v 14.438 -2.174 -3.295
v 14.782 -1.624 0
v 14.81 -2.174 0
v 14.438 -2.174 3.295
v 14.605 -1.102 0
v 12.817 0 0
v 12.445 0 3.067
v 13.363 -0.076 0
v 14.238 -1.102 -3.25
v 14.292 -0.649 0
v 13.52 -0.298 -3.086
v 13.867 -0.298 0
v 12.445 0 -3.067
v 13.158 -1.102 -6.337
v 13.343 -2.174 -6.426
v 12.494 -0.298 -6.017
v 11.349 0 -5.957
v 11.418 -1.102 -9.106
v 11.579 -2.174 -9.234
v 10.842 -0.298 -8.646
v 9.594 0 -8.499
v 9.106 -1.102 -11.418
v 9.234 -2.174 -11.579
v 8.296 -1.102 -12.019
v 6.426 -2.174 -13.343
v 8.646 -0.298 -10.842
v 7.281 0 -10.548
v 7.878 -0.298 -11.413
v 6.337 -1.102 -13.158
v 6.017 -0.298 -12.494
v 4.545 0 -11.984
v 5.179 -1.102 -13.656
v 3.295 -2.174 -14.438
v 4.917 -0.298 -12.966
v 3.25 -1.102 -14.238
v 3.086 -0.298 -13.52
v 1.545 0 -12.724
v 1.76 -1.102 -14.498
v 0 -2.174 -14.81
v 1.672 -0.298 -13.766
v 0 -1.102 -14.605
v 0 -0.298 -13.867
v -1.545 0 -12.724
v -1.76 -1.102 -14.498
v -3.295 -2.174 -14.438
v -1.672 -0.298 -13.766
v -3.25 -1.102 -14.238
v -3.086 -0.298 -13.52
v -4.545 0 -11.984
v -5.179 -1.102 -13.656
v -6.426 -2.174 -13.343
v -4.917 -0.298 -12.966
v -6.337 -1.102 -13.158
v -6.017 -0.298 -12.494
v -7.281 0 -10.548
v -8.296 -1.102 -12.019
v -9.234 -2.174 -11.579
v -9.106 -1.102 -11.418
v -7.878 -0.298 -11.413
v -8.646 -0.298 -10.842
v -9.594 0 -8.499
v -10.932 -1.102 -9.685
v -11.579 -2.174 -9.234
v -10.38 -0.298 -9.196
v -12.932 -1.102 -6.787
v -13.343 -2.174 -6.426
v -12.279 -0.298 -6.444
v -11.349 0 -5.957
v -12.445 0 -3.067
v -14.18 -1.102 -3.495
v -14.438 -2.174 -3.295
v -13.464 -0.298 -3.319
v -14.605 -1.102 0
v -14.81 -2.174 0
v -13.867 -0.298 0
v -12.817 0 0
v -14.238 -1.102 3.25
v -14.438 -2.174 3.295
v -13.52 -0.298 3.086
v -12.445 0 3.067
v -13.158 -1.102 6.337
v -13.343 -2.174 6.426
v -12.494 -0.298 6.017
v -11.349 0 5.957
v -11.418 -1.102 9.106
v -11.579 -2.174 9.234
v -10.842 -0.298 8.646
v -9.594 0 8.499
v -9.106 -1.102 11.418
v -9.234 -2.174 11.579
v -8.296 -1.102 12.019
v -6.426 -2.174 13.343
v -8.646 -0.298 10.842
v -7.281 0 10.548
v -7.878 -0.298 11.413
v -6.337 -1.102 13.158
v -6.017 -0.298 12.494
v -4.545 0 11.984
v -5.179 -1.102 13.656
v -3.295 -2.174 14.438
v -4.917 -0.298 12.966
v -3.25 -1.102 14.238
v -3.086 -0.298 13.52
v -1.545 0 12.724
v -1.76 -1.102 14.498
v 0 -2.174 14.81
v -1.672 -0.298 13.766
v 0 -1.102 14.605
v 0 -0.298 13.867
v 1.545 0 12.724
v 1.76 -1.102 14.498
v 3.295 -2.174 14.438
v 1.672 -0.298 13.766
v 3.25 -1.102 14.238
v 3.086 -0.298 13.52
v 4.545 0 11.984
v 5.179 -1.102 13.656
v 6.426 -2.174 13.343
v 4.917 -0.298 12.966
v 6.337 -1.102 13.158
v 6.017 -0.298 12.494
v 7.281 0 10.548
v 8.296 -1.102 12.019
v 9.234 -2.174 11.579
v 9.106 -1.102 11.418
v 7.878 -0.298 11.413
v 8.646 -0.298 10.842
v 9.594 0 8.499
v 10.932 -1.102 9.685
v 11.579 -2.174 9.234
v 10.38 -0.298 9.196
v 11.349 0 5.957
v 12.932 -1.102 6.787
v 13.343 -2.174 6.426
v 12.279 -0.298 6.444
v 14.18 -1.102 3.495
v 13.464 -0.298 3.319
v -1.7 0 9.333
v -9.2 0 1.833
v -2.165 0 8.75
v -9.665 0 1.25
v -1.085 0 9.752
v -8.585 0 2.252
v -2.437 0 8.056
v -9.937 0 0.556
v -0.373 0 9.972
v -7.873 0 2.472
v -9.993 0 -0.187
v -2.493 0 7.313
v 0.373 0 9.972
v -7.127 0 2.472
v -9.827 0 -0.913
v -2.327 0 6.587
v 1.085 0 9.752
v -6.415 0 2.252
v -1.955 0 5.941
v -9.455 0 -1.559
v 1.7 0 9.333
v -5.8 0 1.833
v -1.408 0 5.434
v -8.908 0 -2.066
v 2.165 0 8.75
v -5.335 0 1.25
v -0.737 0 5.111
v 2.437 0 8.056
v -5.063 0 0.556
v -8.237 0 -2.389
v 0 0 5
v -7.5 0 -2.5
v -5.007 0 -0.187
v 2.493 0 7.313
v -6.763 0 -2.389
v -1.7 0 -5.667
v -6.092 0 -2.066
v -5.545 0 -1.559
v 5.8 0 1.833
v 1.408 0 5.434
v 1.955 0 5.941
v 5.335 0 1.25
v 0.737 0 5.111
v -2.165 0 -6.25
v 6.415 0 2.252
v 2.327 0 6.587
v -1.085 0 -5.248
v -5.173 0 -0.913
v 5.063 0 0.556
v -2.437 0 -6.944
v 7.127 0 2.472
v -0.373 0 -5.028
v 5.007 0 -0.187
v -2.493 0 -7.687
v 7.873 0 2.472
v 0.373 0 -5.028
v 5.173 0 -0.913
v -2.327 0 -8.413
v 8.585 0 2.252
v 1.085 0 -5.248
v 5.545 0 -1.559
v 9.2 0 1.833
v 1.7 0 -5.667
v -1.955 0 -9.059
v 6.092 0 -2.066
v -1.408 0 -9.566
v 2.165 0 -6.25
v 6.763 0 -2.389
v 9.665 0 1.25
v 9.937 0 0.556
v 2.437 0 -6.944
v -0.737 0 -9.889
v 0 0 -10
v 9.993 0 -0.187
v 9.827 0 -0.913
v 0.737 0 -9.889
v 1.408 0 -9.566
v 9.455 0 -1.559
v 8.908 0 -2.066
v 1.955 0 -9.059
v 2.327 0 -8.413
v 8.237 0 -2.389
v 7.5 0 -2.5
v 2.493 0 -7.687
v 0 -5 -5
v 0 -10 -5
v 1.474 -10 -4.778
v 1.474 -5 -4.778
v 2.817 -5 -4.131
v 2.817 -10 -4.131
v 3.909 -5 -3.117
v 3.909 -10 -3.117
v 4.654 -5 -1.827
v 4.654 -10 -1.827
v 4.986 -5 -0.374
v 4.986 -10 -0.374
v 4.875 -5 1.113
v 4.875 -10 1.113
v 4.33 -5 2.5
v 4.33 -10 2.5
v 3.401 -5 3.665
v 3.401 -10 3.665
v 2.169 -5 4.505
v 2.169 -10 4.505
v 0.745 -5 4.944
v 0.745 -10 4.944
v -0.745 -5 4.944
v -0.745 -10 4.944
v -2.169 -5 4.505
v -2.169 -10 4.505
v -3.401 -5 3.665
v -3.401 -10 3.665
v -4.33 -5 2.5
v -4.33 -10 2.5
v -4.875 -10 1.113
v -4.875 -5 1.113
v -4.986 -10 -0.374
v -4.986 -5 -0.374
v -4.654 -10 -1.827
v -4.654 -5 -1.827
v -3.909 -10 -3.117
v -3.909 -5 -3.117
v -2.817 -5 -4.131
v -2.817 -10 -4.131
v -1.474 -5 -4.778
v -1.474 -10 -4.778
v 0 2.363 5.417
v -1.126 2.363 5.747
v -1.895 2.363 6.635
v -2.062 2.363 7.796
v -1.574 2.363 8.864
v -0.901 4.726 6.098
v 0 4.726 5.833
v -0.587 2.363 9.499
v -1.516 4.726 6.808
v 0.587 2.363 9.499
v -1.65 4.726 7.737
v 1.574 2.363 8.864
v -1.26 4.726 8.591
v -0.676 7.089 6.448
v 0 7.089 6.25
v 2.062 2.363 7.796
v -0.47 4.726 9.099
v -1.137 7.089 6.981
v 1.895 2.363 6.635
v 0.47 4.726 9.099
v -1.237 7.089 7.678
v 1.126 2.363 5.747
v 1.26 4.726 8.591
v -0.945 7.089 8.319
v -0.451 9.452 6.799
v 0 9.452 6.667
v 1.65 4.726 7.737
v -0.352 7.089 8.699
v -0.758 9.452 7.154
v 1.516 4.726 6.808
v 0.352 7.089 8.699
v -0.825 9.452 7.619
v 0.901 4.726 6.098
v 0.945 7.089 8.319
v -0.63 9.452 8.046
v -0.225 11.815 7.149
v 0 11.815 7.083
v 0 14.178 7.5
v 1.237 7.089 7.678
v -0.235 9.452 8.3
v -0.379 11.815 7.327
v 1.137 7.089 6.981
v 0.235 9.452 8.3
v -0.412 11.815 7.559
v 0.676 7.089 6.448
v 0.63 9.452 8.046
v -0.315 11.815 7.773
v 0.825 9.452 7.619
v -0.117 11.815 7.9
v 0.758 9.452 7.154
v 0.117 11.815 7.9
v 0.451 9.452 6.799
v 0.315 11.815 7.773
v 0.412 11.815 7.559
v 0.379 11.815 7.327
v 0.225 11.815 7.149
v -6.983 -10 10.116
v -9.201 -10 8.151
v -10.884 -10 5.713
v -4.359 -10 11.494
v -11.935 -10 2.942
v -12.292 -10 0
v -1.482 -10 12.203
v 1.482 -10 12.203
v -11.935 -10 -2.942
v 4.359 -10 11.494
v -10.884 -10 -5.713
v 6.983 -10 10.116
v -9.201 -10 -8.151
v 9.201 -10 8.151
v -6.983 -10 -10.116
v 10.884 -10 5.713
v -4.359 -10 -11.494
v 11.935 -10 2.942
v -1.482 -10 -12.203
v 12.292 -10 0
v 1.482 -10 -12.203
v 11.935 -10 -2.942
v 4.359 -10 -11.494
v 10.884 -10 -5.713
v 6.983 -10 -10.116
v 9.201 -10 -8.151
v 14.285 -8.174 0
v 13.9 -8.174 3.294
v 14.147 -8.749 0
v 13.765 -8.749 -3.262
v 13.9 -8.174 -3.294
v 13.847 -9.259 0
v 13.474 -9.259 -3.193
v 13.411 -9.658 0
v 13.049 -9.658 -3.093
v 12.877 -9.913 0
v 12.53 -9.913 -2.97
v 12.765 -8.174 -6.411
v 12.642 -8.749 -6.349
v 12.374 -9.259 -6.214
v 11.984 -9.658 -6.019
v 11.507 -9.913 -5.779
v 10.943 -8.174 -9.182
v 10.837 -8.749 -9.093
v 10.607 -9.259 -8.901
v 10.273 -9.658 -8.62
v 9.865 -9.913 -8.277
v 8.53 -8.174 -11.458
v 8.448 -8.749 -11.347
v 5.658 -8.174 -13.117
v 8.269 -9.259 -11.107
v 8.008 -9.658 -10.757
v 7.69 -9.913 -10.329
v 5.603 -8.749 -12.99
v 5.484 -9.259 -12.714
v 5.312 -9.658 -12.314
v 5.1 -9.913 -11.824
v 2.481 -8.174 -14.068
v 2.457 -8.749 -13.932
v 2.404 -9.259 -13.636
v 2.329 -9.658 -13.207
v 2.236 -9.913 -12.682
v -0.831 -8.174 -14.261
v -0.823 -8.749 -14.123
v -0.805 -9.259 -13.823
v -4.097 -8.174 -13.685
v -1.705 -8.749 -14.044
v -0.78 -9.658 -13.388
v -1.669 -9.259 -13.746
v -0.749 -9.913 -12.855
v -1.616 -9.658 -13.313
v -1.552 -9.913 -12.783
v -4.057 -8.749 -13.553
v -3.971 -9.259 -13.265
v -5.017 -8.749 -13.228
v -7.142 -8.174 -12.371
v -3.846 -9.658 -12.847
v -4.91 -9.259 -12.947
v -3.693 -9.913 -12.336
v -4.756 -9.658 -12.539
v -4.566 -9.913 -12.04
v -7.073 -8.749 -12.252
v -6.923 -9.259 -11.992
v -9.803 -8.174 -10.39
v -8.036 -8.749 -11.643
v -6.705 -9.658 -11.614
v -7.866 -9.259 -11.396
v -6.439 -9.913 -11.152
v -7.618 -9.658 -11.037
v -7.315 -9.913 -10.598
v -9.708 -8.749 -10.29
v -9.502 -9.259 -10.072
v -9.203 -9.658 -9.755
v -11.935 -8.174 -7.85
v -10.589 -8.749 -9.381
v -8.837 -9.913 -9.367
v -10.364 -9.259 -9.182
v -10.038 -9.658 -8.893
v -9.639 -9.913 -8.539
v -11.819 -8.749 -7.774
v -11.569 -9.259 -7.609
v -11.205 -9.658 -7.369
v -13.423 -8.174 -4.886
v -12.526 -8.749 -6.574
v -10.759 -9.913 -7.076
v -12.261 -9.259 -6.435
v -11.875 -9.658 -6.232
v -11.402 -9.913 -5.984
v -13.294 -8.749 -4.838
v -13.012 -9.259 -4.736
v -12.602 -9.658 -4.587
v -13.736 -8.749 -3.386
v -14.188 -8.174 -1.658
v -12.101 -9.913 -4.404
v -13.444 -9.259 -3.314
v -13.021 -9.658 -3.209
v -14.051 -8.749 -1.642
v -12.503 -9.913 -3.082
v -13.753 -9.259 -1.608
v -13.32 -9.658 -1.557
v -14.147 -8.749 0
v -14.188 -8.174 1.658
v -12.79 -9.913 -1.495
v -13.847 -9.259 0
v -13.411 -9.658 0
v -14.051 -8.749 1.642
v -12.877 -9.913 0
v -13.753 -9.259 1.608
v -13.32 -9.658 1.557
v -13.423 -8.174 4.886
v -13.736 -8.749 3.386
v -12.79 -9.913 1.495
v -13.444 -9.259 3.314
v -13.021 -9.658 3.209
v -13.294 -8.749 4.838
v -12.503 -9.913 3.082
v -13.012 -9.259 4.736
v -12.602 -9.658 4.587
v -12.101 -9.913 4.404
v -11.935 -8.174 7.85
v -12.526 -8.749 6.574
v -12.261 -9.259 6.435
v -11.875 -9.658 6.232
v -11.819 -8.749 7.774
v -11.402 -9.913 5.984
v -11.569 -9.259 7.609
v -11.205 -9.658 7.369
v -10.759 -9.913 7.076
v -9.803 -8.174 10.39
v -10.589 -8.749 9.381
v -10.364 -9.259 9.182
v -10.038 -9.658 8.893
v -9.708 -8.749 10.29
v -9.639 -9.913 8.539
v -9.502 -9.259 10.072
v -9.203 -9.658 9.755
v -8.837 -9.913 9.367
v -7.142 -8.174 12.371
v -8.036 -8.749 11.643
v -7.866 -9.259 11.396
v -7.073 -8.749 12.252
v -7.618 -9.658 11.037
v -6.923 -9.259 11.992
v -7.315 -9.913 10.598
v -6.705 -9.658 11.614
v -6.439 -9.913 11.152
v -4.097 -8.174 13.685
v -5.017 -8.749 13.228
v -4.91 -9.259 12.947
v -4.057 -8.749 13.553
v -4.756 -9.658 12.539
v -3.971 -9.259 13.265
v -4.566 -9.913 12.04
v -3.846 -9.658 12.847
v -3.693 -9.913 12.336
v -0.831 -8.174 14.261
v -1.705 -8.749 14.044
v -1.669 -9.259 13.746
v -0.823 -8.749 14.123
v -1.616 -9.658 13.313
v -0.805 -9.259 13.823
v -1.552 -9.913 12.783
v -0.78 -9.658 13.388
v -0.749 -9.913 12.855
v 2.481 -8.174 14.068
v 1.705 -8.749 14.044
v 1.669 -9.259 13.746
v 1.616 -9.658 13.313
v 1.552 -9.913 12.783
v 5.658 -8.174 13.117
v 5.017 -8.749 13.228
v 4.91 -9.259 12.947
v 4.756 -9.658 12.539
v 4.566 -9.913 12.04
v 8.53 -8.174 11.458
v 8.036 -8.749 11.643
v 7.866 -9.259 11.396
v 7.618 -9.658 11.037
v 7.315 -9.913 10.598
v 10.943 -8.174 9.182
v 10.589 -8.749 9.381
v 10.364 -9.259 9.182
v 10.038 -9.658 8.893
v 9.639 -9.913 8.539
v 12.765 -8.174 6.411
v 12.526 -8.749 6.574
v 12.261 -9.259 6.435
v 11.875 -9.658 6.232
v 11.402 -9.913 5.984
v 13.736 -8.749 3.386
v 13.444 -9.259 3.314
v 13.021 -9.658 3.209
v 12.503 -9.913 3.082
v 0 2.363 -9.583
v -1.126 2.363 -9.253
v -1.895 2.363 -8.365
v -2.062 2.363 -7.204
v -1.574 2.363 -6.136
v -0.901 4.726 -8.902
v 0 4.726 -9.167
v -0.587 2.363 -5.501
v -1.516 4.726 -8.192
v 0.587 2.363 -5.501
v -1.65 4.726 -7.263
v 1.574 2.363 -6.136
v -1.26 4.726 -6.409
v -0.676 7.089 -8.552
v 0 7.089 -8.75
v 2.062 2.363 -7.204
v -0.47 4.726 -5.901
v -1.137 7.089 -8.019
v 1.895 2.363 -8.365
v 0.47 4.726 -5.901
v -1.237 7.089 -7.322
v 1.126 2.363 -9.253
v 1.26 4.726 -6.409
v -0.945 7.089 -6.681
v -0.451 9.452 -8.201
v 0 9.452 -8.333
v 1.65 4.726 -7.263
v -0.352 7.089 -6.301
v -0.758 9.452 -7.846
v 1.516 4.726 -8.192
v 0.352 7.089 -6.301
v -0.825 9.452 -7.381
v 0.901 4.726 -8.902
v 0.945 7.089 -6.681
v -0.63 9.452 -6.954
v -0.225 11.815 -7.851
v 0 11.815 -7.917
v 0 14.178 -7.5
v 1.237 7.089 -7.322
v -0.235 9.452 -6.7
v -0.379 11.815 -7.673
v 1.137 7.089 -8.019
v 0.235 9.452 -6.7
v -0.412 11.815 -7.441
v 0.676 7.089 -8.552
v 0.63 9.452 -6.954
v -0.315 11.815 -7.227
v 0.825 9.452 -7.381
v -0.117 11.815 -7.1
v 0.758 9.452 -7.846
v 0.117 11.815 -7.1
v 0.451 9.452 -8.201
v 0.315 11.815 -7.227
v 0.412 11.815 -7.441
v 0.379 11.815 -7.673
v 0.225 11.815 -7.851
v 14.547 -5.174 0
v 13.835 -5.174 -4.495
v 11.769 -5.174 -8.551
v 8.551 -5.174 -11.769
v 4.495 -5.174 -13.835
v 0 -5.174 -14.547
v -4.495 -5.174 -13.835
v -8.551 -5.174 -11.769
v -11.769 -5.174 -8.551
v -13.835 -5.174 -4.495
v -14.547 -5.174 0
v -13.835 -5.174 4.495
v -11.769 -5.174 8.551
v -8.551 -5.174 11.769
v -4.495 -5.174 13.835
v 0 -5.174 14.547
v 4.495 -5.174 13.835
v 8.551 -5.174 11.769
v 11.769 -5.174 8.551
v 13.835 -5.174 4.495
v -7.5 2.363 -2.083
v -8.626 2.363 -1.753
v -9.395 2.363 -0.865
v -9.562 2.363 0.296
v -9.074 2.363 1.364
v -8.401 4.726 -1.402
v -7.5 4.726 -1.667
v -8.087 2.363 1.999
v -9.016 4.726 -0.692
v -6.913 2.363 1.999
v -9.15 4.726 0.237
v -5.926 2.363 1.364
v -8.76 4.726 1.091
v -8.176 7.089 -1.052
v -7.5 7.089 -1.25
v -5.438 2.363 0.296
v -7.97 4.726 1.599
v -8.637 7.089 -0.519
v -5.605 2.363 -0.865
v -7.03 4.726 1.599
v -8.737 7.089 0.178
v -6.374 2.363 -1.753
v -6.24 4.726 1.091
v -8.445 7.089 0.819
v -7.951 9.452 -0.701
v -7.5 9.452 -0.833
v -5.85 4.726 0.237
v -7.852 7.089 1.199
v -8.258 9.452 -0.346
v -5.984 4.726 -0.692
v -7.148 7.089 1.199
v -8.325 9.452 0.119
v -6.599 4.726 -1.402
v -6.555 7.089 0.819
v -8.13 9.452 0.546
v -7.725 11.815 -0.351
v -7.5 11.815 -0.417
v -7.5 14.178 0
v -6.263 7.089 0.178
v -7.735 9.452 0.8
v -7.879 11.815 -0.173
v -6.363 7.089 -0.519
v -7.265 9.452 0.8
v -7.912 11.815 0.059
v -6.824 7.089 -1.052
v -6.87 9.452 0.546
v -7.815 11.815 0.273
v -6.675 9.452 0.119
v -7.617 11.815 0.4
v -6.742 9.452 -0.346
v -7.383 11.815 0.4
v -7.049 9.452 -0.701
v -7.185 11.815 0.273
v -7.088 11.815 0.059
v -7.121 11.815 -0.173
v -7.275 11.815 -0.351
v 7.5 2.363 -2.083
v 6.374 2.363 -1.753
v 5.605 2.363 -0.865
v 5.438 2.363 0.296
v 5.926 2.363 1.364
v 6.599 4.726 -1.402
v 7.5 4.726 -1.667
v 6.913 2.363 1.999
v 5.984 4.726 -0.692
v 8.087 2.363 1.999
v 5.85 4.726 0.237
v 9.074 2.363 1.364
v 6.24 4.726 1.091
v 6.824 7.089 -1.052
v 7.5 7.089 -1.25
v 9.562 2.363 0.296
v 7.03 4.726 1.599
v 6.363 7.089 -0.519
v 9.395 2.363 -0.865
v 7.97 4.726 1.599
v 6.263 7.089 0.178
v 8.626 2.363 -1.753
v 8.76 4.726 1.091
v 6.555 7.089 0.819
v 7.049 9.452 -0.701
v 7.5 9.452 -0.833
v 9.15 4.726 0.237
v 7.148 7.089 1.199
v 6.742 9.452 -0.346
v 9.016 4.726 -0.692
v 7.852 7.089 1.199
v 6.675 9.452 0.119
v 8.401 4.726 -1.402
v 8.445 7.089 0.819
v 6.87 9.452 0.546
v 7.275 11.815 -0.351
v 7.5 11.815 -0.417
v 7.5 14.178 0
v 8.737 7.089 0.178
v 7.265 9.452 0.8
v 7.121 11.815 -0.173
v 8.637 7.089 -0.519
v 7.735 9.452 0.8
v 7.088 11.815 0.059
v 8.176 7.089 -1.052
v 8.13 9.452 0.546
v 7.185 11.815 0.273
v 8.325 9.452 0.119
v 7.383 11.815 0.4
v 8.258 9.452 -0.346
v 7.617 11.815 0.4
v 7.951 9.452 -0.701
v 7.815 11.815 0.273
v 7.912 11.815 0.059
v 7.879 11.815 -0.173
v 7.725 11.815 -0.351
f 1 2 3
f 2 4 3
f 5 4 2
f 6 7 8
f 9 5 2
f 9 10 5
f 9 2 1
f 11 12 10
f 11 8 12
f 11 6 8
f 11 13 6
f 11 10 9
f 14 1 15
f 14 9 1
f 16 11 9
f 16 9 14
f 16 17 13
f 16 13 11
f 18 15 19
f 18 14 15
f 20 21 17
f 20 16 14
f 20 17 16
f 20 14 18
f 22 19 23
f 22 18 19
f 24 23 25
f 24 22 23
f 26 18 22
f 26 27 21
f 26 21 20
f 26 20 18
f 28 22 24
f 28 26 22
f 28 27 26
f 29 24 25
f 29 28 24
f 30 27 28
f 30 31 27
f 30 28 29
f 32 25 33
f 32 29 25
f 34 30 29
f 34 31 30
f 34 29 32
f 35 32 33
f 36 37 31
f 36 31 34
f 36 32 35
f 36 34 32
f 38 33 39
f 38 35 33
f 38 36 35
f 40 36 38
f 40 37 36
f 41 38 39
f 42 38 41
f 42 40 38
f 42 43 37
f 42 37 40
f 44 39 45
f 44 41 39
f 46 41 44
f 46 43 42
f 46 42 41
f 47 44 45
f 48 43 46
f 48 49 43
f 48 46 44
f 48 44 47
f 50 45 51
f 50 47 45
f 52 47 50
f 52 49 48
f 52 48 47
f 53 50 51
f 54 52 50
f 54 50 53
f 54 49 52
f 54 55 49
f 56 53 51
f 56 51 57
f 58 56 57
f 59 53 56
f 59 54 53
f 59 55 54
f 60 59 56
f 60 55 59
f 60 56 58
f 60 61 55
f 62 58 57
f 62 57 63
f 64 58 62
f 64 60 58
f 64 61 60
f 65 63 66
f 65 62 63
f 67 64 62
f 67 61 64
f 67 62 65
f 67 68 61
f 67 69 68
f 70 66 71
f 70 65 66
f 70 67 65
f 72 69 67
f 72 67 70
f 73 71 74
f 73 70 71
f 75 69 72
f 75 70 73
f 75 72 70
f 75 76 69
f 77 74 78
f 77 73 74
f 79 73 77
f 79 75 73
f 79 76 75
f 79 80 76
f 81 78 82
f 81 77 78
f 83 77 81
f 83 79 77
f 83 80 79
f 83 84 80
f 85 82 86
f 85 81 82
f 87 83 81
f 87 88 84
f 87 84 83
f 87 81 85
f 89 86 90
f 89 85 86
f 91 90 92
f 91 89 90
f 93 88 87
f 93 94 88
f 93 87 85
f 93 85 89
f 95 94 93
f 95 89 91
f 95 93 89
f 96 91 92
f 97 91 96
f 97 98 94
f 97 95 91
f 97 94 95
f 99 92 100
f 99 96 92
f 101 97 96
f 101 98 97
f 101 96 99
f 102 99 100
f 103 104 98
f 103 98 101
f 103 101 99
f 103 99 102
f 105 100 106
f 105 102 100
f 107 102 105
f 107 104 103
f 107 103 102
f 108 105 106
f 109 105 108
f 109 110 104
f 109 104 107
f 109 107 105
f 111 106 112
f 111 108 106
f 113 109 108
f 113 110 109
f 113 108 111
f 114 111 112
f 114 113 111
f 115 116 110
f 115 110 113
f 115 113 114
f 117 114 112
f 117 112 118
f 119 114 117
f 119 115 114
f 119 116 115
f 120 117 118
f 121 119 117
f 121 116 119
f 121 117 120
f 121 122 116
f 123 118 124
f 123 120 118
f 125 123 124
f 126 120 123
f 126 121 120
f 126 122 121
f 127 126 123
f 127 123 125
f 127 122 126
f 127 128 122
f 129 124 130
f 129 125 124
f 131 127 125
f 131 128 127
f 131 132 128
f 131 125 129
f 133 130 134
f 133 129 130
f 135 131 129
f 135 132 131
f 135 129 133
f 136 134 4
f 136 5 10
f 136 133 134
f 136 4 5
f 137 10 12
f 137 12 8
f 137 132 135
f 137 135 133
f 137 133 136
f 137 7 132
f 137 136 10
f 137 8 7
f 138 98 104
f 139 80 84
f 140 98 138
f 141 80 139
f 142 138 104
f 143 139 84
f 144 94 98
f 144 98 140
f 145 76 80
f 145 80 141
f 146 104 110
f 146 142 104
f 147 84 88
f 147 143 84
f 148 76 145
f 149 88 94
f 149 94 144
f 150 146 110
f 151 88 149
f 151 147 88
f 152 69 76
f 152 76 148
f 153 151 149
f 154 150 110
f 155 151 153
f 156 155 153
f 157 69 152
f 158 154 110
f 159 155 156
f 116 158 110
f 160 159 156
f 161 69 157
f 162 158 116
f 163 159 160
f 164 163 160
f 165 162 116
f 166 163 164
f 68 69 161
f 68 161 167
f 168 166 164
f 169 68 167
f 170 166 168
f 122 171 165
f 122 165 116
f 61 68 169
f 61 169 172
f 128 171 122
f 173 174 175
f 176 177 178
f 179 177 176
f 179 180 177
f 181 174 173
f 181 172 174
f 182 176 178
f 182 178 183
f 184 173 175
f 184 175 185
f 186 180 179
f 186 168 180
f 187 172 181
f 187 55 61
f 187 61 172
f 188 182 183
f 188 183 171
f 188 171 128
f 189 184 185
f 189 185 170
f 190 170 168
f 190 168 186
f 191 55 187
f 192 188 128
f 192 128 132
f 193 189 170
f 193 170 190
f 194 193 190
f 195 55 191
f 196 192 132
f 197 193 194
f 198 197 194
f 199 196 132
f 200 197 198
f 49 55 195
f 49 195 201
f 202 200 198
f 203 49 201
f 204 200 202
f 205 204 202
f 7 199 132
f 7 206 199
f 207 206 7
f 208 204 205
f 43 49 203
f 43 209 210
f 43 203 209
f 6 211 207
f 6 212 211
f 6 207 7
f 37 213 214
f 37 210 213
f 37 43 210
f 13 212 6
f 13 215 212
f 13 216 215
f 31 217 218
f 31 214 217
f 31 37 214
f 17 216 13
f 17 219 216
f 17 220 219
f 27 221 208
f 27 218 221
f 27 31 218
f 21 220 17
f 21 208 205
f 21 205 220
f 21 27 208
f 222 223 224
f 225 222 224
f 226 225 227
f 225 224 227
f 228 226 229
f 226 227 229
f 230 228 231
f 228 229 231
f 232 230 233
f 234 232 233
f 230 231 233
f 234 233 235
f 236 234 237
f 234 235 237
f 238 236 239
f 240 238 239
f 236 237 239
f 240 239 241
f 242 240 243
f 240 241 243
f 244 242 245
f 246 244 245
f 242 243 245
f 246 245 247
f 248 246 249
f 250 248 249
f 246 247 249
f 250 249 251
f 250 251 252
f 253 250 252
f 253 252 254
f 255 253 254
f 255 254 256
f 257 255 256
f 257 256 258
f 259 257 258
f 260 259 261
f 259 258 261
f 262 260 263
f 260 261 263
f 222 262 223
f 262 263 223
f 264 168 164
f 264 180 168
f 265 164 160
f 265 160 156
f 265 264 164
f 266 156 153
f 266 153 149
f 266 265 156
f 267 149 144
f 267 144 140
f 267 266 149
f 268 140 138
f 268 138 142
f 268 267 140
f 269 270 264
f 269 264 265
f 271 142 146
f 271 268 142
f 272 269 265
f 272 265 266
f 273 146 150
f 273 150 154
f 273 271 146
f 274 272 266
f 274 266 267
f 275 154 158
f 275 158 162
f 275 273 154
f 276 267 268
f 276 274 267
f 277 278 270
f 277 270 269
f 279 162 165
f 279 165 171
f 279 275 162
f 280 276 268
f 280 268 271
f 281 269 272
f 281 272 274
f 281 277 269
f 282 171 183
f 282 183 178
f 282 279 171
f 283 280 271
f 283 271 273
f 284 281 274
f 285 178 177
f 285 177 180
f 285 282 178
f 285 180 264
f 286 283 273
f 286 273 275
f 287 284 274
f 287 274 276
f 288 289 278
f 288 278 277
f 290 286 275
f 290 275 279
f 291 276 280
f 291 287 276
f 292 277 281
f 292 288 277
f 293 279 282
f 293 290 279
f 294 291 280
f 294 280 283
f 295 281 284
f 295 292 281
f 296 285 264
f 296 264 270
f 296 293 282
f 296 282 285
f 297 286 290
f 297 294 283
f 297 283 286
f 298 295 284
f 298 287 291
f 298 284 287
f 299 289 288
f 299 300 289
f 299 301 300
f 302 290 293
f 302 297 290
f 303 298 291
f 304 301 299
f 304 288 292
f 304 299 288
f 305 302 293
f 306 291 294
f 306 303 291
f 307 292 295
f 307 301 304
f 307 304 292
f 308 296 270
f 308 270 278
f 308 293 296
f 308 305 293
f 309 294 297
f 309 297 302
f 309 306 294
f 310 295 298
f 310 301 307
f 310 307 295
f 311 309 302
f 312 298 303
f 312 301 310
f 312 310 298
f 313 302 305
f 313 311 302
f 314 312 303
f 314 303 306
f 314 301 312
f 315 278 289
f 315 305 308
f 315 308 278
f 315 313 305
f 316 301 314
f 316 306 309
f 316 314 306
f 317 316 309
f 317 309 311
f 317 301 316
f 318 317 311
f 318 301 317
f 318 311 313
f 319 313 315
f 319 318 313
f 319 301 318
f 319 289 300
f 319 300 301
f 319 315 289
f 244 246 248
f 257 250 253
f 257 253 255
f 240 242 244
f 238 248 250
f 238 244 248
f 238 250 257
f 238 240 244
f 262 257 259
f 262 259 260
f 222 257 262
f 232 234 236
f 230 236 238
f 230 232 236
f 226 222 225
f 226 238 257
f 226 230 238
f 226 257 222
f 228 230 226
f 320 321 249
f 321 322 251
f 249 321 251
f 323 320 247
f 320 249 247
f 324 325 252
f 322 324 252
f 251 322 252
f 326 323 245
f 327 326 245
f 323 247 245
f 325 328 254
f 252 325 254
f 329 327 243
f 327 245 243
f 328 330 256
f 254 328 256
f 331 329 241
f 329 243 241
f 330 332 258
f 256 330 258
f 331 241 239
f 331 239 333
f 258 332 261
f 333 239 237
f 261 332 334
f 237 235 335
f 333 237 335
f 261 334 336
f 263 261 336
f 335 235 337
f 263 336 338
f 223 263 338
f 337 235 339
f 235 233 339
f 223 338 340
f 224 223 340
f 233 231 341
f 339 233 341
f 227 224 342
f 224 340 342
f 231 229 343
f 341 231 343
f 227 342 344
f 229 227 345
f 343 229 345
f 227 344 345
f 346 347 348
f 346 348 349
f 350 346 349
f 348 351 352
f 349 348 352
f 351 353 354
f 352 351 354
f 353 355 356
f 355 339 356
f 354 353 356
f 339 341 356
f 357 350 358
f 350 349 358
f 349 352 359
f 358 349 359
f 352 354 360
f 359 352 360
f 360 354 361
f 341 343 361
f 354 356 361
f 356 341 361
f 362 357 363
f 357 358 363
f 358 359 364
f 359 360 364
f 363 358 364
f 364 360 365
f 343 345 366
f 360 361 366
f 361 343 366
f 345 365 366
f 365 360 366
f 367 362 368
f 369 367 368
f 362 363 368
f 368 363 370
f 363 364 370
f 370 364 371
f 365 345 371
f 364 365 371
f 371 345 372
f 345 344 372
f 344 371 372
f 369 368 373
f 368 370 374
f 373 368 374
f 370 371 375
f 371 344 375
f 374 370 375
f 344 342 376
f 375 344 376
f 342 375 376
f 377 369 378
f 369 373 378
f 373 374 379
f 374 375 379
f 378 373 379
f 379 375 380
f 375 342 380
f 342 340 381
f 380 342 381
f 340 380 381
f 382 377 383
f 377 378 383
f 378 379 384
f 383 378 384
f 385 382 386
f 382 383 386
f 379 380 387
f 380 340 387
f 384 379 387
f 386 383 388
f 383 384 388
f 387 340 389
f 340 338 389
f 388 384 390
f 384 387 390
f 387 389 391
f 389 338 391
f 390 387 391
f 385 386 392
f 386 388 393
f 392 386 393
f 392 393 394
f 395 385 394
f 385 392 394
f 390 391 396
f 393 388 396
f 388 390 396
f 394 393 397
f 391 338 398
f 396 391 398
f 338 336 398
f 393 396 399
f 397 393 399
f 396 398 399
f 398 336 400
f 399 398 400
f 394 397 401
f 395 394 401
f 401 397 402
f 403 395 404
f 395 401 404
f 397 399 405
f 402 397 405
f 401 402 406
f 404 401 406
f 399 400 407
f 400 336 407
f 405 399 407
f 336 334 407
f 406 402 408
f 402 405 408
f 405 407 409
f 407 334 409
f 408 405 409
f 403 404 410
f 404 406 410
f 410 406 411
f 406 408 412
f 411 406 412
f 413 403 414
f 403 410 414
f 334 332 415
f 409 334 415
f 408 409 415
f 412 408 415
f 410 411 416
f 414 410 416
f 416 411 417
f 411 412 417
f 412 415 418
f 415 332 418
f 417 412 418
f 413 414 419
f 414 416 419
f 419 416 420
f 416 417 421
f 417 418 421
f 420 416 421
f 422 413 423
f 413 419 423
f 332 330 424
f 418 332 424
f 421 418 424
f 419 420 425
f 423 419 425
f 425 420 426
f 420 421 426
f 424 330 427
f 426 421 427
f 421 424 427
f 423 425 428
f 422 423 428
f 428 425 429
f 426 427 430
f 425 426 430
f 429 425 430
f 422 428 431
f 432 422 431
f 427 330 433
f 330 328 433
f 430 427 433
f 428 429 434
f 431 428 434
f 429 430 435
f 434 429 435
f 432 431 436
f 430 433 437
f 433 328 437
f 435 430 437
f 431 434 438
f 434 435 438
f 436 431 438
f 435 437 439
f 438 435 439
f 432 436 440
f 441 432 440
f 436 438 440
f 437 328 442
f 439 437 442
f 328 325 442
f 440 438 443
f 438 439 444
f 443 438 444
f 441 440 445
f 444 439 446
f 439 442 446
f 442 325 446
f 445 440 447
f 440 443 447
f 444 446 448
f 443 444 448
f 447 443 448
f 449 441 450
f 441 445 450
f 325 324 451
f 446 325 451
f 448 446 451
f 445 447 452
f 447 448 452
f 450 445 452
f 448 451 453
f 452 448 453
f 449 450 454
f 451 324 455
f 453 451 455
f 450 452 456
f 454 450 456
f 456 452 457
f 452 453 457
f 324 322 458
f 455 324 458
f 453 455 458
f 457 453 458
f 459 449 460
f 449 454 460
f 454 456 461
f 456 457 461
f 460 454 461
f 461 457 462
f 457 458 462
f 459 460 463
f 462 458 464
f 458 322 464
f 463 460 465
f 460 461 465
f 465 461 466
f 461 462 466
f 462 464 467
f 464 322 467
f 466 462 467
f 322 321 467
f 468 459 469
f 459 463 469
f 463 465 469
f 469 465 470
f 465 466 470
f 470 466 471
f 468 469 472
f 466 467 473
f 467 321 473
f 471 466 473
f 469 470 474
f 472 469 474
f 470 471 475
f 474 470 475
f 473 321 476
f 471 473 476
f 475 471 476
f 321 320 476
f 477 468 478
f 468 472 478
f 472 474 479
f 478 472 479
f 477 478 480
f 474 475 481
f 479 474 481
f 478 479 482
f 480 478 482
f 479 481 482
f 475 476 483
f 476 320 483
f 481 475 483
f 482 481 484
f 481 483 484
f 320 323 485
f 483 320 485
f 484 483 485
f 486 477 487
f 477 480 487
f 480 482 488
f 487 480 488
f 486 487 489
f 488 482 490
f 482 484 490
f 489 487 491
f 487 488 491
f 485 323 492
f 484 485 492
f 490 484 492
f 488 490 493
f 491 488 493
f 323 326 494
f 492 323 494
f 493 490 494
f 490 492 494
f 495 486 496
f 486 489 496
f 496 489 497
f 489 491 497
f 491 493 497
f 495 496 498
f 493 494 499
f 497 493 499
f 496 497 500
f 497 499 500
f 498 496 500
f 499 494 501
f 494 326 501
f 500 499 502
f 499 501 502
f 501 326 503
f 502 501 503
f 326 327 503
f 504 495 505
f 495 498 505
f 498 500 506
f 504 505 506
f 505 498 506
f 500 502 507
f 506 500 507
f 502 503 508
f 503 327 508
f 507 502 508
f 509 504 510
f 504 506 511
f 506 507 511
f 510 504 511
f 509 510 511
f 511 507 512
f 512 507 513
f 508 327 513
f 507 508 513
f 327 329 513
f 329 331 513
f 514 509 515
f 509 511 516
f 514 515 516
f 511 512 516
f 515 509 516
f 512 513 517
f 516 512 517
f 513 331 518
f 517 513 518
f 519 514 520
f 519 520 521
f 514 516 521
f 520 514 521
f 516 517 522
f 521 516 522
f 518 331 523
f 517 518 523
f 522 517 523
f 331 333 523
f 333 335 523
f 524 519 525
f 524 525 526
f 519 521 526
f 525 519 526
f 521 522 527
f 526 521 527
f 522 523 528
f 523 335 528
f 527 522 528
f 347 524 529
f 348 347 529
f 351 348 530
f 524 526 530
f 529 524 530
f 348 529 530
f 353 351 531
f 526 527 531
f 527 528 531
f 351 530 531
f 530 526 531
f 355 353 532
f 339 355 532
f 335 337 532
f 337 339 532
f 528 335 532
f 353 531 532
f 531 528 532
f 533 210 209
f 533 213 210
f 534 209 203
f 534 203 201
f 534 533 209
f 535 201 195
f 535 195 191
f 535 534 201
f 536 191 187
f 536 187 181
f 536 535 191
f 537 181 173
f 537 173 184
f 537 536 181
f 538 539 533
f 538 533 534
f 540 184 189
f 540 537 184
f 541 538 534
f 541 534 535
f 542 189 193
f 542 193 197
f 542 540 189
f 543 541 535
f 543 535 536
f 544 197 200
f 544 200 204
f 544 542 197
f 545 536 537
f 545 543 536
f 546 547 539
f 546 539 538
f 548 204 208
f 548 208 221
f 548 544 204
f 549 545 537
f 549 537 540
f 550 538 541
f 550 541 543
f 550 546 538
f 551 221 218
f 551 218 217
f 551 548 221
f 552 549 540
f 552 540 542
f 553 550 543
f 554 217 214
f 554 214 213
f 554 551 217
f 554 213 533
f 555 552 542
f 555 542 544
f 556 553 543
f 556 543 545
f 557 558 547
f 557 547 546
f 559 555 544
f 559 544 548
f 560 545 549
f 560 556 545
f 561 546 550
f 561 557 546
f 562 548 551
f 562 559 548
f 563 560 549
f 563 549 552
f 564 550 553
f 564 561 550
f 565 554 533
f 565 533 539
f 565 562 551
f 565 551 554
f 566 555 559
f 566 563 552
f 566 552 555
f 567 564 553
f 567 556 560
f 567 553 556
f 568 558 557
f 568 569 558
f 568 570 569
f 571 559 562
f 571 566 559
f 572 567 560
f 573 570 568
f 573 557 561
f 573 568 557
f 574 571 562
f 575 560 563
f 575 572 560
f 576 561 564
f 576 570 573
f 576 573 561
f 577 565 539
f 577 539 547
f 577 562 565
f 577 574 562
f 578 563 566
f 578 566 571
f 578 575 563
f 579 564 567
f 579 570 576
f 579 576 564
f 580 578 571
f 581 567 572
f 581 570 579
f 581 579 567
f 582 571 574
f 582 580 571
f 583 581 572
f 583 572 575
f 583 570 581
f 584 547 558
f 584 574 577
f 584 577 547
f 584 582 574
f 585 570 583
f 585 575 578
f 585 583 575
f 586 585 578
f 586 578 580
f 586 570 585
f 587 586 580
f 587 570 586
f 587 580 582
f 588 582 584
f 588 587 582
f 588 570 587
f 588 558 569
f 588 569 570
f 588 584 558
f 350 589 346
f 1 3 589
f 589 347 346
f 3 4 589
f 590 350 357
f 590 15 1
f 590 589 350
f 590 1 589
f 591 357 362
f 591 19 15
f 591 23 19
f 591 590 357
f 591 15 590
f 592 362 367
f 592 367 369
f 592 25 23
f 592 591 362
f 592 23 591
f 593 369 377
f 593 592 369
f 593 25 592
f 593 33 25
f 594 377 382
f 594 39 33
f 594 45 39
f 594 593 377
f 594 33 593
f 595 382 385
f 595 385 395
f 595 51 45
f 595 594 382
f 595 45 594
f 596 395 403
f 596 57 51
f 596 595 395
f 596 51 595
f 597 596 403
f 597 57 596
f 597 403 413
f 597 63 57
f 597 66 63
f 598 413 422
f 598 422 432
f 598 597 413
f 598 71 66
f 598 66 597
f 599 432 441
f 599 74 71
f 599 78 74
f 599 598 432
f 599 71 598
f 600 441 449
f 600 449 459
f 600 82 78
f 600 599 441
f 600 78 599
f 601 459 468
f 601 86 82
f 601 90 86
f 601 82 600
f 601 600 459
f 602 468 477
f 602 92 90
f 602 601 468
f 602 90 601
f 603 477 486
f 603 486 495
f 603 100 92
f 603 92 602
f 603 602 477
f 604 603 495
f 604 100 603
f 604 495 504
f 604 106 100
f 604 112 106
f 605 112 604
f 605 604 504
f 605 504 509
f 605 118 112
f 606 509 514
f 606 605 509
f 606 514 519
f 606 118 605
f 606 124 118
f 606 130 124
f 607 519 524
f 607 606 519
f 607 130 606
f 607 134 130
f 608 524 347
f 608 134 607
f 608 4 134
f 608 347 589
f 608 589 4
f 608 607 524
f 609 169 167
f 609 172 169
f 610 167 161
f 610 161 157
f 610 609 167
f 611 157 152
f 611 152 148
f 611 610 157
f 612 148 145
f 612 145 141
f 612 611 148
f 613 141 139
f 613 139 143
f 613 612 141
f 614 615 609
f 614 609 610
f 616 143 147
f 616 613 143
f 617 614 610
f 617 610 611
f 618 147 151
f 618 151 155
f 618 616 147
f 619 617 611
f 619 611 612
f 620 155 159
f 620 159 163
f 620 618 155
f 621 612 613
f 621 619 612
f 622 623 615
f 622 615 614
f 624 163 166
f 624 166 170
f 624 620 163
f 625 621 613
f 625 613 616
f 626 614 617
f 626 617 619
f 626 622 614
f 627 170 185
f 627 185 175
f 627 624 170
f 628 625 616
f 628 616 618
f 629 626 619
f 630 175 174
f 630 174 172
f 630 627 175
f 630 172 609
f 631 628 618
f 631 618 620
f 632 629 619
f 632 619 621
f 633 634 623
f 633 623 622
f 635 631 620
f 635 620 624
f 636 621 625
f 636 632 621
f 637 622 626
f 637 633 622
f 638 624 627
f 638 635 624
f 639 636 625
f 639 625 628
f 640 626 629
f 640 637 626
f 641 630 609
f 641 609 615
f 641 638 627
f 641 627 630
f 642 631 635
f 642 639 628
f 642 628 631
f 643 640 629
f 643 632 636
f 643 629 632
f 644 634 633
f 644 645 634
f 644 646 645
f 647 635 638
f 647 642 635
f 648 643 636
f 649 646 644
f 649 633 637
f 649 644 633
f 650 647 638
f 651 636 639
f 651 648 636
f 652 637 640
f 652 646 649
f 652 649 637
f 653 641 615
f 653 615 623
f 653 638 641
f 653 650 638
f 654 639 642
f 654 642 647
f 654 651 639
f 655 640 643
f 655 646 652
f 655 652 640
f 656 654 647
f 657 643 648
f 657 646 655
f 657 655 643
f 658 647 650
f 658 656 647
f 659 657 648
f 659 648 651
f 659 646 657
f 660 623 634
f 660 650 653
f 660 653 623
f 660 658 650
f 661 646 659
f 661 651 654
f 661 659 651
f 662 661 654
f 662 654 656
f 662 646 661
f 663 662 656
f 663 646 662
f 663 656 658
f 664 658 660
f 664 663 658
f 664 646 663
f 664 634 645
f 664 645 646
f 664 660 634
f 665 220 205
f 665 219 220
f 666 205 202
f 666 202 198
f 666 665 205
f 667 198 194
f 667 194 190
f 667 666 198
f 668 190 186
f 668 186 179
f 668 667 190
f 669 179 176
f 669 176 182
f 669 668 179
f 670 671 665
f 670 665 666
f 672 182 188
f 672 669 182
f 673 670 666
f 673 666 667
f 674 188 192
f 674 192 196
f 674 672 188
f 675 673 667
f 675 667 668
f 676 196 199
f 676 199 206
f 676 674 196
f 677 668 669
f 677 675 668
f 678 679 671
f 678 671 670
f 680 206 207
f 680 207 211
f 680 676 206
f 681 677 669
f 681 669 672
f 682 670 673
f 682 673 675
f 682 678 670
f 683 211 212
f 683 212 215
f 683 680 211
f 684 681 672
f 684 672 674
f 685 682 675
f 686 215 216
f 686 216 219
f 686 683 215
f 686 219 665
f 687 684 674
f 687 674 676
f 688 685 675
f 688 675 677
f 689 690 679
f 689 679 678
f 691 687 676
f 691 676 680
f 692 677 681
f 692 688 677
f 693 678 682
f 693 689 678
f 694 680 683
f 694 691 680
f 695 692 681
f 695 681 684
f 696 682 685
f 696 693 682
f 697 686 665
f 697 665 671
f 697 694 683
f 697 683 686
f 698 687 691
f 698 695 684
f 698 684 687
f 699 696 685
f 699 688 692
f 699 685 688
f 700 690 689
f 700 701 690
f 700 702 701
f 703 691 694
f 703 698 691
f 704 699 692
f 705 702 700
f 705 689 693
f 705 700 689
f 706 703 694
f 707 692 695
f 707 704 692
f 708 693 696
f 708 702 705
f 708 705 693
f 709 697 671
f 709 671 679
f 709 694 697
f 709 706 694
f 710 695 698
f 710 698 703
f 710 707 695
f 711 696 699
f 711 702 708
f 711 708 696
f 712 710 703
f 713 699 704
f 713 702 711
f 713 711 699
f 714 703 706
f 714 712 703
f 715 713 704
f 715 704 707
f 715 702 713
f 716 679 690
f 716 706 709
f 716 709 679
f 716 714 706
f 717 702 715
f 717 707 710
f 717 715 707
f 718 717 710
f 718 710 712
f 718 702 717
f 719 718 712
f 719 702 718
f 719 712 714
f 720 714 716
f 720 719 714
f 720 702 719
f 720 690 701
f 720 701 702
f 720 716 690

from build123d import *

# Parameters (mm, degrees)
SKETCH1_R           = 15
BOSS_EXTRUDE1_DEPTH = 10
BOSS_EXTRUDE1_DRAFT = -5
SKETCH3_R           = 5
CUT_EXTRUDE1_DEPTH  = 5
FILLET1_R           = 2


with BuildPart() as part:
    # Sketch1 → Boss-Extrude1 (with draft: the straight prism first)
    with BuildSketch(Plane(origin=(0, 0, 0), x_dir=(1, 0, 0), z_dir=(0, 1, 0))):
        Circle(SKETCH1_R)
    extrude(amount=-BOSS_EXTRUDE1_DEPTH)
    # Boss-Extrude1: the draft: its side faces are tilted about the plane it starts from
    boss_extrude1_sides = [part.faces().sort_by_distance(p)[0] for p in [
        (-15, -5, 0),
    ]]
    draft(boss_extrude1_sides, Plane(origin=(0, 0, 0), x_dir=(1, 0, 0), z_dir=(0, 1, 0)), BOSS_EXTRUDE1_DRAFT)

    # Boss-Extrude2 cone 1 section (through the dimple's axis) → Boss-Extrude2 (revolve)
    with BuildSketch(Plane(origin=(0, 0, -7.5), x_dir=(0, 0, -1), z_dir=(1, 0, 0))):
        Polygon((0, 0), (2.5, 0), (0, 14.178204549), align=None)
    revolve(axis=Axis((0, 0, -7.5), (0, 1, 0)))

    # Boss-Extrude2 cone 2 section (through the dimple's axis) → Boss-Extrude2 cone 2 (revolve)
    with BuildSketch(Plane(origin=(7.5, 0, 0), x_dir=(0, 0, -1), z_dir=(1, 0, 0))):
        Polygon((0, 0), (2.5, 0), (0, 14.178204549), align=None)
    revolve(axis=Axis((7.5, 0, 0), (0, 1, 0)))

    # Boss-Extrude2 cone 3 section (through the dimple's axis) → Boss-Extrude2 cone 3 (revolve)
    with BuildSketch(Plane(origin=(0, 0, 7.5), x_dir=(0, 0, -1), z_dir=(1, 0, 0))):
        Polygon((0, 0), (2.5, 0), (0, 14.178204549), align=None)
    revolve(axis=Axis((0, 0, 7.5), (0, 1, 0)))

    # Boss-Extrude2 cone 4 section (through the dimple's axis) → Boss-Extrude2 cone 4 (revolve)
    with BuildSketch(Plane(origin=(-7.5, 0, 0), x_dir=(0, 0, -1), z_dir=(1, 0, 0))):
        Polygon((0, 0), (2.5, 0), (0, 14.178204549), align=None)
    revolve(axis=Axis((-7.5, 0, 0), (0, 1, 0)))

    # Sketch3 → Cut-Extrude1 (cut)
    with BuildSketch(Plane(origin=(0, -10, 0), x_dir=(-1, 0, 0), z_dir=(0, -1, 0))):
        with Locations(Location((0, 0, 0), (0, 0, 90))):
            Circle(SKETCH3_R)
    extrude(amount=-CUT_EXTRUDE1_DEPTH, mode=Mode.SUBTRACT)

    # Fillet1
    fillet1_edges = [part.edges().sort_by_distance(p)[0] for p in [
        (-15, 0, 0),
        (-14.125113365, -10, 0),
    ]]
    fillet(fillet1_edges, radius=FILLET1_R)


solid = part.part
